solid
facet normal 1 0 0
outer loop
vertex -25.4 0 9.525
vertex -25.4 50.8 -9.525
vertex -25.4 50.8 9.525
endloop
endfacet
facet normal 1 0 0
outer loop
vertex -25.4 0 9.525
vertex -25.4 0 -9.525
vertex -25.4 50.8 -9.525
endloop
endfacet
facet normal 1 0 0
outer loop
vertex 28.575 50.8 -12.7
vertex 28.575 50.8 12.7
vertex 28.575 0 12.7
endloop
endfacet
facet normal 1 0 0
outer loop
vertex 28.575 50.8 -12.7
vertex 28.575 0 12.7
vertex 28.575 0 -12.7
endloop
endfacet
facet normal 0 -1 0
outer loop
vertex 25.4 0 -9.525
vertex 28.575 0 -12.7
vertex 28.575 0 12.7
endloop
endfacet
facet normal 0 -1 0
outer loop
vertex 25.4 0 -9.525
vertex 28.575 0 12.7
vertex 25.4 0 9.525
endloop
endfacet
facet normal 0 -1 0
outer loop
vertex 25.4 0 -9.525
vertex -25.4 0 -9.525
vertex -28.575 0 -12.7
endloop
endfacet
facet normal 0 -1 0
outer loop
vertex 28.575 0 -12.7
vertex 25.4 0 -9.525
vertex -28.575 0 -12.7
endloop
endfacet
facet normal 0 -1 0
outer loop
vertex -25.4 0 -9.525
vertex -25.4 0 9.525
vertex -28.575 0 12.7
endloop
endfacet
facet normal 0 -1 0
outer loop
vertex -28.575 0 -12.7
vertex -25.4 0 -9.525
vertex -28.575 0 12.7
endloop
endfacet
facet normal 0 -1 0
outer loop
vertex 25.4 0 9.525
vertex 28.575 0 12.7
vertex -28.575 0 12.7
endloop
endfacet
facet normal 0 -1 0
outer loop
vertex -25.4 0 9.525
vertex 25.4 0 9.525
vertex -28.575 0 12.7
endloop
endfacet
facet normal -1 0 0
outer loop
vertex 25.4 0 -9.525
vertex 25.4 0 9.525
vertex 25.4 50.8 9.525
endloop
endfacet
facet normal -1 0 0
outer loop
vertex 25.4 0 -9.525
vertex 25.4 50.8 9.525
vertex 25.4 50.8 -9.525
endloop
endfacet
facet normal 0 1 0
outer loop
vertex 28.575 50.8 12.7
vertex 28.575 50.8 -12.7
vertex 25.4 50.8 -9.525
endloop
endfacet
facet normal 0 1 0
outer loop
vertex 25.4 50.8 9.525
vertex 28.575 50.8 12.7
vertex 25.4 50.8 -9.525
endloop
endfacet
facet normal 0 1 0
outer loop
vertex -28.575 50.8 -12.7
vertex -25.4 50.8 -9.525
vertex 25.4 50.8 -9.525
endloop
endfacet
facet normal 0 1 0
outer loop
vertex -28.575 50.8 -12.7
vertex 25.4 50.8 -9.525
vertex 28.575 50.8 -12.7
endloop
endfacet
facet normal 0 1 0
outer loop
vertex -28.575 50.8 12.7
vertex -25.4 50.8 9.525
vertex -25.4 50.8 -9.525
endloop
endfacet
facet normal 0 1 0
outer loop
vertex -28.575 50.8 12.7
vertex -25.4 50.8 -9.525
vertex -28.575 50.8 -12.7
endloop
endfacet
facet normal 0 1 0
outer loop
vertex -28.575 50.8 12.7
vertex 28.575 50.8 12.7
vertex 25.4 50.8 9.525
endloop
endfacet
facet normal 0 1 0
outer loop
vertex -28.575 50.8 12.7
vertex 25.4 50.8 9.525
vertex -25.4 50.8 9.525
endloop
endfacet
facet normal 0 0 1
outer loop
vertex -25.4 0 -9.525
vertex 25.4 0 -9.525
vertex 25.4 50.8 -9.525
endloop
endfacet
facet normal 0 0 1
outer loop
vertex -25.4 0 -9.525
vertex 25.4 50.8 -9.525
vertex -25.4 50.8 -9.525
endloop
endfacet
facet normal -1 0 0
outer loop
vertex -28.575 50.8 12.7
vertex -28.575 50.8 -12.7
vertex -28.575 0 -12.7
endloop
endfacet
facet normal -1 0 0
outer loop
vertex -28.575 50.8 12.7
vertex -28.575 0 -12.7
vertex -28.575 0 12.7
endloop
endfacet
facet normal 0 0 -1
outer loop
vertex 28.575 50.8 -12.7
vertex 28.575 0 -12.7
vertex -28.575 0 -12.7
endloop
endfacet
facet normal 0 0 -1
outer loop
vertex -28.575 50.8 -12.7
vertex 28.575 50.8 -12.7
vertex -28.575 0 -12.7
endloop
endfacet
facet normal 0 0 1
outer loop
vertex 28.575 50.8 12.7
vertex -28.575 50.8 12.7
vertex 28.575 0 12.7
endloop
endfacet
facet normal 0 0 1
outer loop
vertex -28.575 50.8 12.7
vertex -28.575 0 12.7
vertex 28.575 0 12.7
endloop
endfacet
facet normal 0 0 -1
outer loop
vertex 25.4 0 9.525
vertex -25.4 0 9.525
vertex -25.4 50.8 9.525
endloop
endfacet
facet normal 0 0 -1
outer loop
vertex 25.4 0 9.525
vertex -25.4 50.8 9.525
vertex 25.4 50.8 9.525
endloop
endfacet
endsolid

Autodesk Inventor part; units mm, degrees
ref_plane "YZ Plane" through (0, 0, 0) normal (1, 0, 0) x (0, 1, 0)
ref_plane "XZ Plane" through (0, 0, 0) normal (0, 1, 0) x (-1, 0, 0)
ref_plane "XY Plane" through (0, 0, 0) normal (0, 0, 1) x (1, 0, 0)
sketch "Sketch1" plane through (0, 0, 0) normal (0, 1, 0) x (-1, 0, 0)
  line L0 (-28.575, 12.7) -> (-28.575, -12.7)
  line L1 (-28.575, -12.7) -> (28.575, -12.7)
  line L2 (28.575, -12.7) -> (28.575, 12.7)
  line L3 (28.575, 12.7) -> (-28.575, 12.7)
  line L4 (-28.575, 12.7) -> (28.575, -12.7) construction
  line L5 (-28.575, -12.7) -> (28.575, 12.7) construction
  line L6 (-25.4, 9.525) -> (-25.4, -9.525)
  line L7 (-25.4, -9.525) -> (25.4, -9.525)
  line L8 (25.4, -9.525) -> (25.4, 9.525)
  line L9 (25.4, 9.525) -> (-25.4, 9.525)
  line L10 (-25.4, 9.525) -> (25.4, -9.525) construction
  line L11 (-25.4, -9.525) -> (25.4, 9.525) construction
  point P0 (0, 0)
  dimension "d0" = 25.4
  dimension "d1" = 57.15
  dimension "d2" = 3.175
  dimension "d3" = 3.175
extrude "Extrusion1" add sketch "Sketch1" along normal blind 50.8
properties part number "spacer-1x2_250"
